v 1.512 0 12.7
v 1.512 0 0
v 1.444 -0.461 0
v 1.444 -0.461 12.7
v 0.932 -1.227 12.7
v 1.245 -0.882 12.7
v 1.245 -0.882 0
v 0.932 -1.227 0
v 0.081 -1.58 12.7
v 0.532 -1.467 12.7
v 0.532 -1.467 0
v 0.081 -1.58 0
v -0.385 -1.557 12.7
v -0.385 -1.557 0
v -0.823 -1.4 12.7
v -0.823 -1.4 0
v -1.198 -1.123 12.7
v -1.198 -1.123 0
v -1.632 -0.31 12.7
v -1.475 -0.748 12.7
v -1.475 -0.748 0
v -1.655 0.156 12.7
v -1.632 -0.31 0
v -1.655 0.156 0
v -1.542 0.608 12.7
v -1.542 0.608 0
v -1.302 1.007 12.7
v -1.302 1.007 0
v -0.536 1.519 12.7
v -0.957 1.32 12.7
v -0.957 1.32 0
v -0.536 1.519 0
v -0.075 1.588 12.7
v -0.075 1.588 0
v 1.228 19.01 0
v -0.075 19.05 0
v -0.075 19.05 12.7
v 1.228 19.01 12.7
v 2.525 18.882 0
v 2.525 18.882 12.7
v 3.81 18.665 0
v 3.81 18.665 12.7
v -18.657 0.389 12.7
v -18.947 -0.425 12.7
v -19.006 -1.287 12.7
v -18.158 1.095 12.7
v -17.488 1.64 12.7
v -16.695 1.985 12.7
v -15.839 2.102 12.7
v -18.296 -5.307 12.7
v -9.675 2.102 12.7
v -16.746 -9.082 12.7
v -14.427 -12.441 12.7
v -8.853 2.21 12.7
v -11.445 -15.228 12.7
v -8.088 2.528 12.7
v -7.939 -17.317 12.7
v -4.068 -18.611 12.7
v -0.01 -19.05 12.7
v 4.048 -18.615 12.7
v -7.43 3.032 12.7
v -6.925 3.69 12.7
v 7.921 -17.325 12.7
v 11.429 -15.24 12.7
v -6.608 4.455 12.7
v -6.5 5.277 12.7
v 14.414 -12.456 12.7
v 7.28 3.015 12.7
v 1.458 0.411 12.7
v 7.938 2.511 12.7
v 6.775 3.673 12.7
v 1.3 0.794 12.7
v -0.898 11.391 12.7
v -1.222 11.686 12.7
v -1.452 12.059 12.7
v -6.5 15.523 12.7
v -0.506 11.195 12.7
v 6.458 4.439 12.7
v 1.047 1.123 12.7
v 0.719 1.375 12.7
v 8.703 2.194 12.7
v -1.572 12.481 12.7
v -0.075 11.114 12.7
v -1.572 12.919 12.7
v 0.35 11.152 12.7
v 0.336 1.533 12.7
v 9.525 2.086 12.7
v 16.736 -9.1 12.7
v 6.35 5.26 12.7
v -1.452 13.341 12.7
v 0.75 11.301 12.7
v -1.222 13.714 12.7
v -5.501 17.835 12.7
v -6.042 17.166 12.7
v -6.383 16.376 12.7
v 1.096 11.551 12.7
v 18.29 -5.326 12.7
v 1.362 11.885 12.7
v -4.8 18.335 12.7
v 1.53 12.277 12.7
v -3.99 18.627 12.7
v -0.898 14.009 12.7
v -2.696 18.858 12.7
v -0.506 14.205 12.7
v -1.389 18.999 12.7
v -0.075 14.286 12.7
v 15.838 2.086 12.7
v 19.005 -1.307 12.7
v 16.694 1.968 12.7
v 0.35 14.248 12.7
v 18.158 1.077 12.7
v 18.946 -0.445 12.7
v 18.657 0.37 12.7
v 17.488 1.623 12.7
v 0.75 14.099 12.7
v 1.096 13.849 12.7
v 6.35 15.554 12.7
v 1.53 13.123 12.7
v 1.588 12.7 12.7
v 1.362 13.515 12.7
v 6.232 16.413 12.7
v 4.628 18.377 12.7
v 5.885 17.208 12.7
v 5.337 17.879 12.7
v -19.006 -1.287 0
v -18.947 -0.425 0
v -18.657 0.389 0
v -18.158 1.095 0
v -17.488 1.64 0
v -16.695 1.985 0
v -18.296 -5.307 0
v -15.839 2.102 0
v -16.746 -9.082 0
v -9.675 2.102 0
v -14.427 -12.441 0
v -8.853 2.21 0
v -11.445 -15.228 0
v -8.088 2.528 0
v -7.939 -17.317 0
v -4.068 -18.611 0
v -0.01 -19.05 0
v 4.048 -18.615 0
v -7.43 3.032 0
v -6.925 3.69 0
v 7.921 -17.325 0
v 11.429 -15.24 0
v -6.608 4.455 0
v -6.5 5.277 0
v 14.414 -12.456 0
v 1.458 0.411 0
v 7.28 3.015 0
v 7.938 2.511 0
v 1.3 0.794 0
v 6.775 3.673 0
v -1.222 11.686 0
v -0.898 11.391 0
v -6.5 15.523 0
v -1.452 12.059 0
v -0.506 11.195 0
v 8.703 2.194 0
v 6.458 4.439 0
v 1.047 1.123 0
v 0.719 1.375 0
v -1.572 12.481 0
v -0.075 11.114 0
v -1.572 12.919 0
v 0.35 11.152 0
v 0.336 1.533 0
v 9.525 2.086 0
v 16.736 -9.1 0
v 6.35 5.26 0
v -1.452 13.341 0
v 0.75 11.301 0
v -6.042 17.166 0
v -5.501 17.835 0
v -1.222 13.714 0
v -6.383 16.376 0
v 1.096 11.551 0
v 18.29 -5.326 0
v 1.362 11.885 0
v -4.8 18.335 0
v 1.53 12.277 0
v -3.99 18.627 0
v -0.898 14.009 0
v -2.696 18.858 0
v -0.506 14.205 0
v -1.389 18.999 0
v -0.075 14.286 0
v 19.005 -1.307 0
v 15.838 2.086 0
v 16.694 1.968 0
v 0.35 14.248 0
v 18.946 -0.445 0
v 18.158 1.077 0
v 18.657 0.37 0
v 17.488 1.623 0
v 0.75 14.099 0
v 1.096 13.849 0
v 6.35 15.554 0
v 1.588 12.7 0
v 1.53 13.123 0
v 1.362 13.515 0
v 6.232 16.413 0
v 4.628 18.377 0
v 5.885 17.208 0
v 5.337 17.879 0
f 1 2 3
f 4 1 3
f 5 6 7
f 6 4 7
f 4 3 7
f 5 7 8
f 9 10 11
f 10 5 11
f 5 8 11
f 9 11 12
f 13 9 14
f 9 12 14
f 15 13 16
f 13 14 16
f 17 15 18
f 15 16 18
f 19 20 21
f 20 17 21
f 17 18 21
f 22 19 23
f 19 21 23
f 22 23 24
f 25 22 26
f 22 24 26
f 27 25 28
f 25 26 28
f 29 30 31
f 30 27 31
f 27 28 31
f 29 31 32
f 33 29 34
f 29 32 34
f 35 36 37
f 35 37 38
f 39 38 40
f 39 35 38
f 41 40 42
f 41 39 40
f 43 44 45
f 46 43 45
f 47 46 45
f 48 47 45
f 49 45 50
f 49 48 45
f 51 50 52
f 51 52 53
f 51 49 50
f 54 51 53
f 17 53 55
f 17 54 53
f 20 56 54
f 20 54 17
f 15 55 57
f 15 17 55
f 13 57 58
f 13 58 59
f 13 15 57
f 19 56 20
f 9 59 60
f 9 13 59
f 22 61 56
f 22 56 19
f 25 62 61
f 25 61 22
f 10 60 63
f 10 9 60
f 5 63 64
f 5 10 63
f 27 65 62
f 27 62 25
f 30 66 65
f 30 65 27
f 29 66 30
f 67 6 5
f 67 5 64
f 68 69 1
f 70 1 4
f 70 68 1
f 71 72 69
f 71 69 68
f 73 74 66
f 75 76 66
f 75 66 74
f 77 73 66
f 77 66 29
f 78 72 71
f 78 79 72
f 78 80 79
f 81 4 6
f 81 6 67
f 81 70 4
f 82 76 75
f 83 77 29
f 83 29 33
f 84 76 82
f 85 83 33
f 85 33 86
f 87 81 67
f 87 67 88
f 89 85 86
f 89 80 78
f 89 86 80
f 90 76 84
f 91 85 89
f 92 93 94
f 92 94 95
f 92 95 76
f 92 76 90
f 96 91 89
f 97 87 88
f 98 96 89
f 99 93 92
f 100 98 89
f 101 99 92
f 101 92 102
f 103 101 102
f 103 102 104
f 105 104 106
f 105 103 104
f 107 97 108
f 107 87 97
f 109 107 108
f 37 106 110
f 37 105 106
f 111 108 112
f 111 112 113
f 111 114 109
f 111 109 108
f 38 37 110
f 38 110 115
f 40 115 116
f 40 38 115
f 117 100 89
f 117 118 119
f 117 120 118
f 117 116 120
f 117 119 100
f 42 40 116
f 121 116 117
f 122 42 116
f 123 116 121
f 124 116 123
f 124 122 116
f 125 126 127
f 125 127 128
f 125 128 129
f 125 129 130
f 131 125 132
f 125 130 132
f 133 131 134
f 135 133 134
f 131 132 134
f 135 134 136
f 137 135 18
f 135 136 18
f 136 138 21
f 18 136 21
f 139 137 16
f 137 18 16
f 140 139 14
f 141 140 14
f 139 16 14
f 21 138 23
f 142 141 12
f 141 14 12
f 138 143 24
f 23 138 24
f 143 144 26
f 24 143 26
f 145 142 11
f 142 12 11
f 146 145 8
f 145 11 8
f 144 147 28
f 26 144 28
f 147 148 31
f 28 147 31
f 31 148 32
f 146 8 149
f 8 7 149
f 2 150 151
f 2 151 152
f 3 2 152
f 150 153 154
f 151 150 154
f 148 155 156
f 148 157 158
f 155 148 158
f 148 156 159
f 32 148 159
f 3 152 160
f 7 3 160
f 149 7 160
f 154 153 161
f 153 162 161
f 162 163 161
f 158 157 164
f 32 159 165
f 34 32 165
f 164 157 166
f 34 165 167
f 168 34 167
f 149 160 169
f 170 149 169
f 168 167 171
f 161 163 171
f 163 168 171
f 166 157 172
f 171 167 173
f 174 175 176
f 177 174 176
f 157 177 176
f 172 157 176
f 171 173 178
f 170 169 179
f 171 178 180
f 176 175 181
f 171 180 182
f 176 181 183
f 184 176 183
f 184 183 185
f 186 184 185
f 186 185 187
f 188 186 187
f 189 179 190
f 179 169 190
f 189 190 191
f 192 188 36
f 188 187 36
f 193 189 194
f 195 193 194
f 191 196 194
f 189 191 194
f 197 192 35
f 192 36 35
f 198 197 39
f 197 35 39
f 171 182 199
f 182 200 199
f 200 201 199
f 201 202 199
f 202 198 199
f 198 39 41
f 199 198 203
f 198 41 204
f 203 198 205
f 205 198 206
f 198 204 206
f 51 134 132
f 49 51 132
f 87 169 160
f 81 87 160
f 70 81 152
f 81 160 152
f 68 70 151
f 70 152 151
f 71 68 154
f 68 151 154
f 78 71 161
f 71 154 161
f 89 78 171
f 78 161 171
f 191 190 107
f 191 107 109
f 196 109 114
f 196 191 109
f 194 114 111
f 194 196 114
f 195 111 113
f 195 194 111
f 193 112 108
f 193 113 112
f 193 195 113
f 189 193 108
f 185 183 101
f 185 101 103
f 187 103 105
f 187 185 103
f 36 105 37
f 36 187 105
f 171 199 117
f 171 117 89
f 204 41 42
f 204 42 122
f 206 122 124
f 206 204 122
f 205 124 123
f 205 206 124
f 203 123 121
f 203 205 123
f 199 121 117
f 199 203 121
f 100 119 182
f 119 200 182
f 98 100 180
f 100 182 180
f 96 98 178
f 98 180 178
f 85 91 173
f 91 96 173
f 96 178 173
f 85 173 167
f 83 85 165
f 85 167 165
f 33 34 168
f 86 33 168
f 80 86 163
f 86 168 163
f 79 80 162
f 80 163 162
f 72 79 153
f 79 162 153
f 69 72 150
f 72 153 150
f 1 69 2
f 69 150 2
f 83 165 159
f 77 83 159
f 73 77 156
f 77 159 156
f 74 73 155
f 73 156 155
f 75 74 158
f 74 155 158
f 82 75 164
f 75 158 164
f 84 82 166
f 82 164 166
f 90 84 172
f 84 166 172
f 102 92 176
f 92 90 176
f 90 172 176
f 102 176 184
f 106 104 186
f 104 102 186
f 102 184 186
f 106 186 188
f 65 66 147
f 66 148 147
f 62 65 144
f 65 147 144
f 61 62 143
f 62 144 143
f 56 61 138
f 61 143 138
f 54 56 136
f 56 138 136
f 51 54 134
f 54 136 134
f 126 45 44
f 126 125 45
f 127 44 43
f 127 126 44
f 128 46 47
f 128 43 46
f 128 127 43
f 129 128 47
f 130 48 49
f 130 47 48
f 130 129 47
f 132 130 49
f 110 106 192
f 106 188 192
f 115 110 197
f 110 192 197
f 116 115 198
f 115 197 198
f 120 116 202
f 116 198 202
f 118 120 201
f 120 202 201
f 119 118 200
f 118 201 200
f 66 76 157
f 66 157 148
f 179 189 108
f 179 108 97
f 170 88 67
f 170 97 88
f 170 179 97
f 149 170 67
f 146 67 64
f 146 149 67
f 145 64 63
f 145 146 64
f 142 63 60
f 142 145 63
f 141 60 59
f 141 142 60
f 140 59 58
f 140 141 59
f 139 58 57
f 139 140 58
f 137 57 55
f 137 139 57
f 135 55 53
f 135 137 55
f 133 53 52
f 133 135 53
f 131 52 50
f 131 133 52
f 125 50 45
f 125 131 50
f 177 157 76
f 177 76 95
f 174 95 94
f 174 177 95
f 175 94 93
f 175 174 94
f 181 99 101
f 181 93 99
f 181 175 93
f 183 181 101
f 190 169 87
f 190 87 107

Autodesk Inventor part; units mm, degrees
ref_plane "YZ Plane" through (0, 0, 0) normal (1, 0, 0) x (0, 1, 0)
ref_plane "XZ Plane" through (0, 0, 0) normal (0, 1, 0) x (-1, 0, 0)
ref_plane "XY Plane" through (0, 0, 0) normal (0, 0, 1) x (1, 0, 0)
sketch "Sketch1" plane through (0, 0, 0) normal (0, 0, 1) x (1, 0, 0)
  circle A0 centre (0, 12.7) radius 1.5875
  circle A1 centre (-0.0751, 0) radius 1.5875
  line L0 (-0.0751, 0) -> (-0.0751, 19.0499)
  line L1 (-0.0751, 1.5875) -> (-0.0751, 24.8386)
  line L2 (6.35, 15.5543) -> (6.35, 5.2605)
  line L3 (9.525, 2.0855) -> (15.8376, 2.0855)
  line L4 (-6.5001, 15.5229) -> (-6.5001, 5.2772)
  line L5 (-9.6751, 2.1022) -> (-15.8387, 2.1022)
  arc A2 (-19.0064, -1.2874) -> (19.0051, -1.3074) centre (0, 0) ccw
  arc A3 (3.81, 18.6651) -> (-3.9901, 18.6274) centre (0, 0) ccw
  arc A4 (-3.9901, 18.6274) -> (-6.5001, 15.5229) centre (-3.3251, 15.5229) ccw
  arc A5 (6.35, 15.5543) -> (3.81, 18.6651) centre (3.175, 15.5543) ccw
  arc A6 (6.35, 5.2605) -> (9.525, 2.0855) centre (9.525, 5.2605) ccw
  arc A7 (-9.6751, 2.1022) -> (-6.5001, 5.2772) centre (-9.6751, 5.2772) ccw
  arc A8 (-15.8387, 2.1022) -> (-19.0064, -1.2874) centre (-15.8387, -1.0728) ccw
  arc A9 (19.0051, -1.3074) -> (15.8376, 2.0855) centre (15.8376, -1.0895) ccw
  point P0 (6.35, 17.9605)
  point P1 (6.35, 2.0855)
  point P2 (18.9355, 2.0855)
  point P3 (-6.5001, 2.1022)
  point P4 (-18.9337, 2.1022)
  point P5 (-6.5001, 17.9067)
  dimension "d6" = 3.175
  dimension "d3" = 3.175
  dimension "d11" = 15.875
  dimension "d12" = 3.175
extrude "Extrusion1" add sketch "Sketch1" along normal blind 12.7
properties part number "Crank Cutting Jig"
